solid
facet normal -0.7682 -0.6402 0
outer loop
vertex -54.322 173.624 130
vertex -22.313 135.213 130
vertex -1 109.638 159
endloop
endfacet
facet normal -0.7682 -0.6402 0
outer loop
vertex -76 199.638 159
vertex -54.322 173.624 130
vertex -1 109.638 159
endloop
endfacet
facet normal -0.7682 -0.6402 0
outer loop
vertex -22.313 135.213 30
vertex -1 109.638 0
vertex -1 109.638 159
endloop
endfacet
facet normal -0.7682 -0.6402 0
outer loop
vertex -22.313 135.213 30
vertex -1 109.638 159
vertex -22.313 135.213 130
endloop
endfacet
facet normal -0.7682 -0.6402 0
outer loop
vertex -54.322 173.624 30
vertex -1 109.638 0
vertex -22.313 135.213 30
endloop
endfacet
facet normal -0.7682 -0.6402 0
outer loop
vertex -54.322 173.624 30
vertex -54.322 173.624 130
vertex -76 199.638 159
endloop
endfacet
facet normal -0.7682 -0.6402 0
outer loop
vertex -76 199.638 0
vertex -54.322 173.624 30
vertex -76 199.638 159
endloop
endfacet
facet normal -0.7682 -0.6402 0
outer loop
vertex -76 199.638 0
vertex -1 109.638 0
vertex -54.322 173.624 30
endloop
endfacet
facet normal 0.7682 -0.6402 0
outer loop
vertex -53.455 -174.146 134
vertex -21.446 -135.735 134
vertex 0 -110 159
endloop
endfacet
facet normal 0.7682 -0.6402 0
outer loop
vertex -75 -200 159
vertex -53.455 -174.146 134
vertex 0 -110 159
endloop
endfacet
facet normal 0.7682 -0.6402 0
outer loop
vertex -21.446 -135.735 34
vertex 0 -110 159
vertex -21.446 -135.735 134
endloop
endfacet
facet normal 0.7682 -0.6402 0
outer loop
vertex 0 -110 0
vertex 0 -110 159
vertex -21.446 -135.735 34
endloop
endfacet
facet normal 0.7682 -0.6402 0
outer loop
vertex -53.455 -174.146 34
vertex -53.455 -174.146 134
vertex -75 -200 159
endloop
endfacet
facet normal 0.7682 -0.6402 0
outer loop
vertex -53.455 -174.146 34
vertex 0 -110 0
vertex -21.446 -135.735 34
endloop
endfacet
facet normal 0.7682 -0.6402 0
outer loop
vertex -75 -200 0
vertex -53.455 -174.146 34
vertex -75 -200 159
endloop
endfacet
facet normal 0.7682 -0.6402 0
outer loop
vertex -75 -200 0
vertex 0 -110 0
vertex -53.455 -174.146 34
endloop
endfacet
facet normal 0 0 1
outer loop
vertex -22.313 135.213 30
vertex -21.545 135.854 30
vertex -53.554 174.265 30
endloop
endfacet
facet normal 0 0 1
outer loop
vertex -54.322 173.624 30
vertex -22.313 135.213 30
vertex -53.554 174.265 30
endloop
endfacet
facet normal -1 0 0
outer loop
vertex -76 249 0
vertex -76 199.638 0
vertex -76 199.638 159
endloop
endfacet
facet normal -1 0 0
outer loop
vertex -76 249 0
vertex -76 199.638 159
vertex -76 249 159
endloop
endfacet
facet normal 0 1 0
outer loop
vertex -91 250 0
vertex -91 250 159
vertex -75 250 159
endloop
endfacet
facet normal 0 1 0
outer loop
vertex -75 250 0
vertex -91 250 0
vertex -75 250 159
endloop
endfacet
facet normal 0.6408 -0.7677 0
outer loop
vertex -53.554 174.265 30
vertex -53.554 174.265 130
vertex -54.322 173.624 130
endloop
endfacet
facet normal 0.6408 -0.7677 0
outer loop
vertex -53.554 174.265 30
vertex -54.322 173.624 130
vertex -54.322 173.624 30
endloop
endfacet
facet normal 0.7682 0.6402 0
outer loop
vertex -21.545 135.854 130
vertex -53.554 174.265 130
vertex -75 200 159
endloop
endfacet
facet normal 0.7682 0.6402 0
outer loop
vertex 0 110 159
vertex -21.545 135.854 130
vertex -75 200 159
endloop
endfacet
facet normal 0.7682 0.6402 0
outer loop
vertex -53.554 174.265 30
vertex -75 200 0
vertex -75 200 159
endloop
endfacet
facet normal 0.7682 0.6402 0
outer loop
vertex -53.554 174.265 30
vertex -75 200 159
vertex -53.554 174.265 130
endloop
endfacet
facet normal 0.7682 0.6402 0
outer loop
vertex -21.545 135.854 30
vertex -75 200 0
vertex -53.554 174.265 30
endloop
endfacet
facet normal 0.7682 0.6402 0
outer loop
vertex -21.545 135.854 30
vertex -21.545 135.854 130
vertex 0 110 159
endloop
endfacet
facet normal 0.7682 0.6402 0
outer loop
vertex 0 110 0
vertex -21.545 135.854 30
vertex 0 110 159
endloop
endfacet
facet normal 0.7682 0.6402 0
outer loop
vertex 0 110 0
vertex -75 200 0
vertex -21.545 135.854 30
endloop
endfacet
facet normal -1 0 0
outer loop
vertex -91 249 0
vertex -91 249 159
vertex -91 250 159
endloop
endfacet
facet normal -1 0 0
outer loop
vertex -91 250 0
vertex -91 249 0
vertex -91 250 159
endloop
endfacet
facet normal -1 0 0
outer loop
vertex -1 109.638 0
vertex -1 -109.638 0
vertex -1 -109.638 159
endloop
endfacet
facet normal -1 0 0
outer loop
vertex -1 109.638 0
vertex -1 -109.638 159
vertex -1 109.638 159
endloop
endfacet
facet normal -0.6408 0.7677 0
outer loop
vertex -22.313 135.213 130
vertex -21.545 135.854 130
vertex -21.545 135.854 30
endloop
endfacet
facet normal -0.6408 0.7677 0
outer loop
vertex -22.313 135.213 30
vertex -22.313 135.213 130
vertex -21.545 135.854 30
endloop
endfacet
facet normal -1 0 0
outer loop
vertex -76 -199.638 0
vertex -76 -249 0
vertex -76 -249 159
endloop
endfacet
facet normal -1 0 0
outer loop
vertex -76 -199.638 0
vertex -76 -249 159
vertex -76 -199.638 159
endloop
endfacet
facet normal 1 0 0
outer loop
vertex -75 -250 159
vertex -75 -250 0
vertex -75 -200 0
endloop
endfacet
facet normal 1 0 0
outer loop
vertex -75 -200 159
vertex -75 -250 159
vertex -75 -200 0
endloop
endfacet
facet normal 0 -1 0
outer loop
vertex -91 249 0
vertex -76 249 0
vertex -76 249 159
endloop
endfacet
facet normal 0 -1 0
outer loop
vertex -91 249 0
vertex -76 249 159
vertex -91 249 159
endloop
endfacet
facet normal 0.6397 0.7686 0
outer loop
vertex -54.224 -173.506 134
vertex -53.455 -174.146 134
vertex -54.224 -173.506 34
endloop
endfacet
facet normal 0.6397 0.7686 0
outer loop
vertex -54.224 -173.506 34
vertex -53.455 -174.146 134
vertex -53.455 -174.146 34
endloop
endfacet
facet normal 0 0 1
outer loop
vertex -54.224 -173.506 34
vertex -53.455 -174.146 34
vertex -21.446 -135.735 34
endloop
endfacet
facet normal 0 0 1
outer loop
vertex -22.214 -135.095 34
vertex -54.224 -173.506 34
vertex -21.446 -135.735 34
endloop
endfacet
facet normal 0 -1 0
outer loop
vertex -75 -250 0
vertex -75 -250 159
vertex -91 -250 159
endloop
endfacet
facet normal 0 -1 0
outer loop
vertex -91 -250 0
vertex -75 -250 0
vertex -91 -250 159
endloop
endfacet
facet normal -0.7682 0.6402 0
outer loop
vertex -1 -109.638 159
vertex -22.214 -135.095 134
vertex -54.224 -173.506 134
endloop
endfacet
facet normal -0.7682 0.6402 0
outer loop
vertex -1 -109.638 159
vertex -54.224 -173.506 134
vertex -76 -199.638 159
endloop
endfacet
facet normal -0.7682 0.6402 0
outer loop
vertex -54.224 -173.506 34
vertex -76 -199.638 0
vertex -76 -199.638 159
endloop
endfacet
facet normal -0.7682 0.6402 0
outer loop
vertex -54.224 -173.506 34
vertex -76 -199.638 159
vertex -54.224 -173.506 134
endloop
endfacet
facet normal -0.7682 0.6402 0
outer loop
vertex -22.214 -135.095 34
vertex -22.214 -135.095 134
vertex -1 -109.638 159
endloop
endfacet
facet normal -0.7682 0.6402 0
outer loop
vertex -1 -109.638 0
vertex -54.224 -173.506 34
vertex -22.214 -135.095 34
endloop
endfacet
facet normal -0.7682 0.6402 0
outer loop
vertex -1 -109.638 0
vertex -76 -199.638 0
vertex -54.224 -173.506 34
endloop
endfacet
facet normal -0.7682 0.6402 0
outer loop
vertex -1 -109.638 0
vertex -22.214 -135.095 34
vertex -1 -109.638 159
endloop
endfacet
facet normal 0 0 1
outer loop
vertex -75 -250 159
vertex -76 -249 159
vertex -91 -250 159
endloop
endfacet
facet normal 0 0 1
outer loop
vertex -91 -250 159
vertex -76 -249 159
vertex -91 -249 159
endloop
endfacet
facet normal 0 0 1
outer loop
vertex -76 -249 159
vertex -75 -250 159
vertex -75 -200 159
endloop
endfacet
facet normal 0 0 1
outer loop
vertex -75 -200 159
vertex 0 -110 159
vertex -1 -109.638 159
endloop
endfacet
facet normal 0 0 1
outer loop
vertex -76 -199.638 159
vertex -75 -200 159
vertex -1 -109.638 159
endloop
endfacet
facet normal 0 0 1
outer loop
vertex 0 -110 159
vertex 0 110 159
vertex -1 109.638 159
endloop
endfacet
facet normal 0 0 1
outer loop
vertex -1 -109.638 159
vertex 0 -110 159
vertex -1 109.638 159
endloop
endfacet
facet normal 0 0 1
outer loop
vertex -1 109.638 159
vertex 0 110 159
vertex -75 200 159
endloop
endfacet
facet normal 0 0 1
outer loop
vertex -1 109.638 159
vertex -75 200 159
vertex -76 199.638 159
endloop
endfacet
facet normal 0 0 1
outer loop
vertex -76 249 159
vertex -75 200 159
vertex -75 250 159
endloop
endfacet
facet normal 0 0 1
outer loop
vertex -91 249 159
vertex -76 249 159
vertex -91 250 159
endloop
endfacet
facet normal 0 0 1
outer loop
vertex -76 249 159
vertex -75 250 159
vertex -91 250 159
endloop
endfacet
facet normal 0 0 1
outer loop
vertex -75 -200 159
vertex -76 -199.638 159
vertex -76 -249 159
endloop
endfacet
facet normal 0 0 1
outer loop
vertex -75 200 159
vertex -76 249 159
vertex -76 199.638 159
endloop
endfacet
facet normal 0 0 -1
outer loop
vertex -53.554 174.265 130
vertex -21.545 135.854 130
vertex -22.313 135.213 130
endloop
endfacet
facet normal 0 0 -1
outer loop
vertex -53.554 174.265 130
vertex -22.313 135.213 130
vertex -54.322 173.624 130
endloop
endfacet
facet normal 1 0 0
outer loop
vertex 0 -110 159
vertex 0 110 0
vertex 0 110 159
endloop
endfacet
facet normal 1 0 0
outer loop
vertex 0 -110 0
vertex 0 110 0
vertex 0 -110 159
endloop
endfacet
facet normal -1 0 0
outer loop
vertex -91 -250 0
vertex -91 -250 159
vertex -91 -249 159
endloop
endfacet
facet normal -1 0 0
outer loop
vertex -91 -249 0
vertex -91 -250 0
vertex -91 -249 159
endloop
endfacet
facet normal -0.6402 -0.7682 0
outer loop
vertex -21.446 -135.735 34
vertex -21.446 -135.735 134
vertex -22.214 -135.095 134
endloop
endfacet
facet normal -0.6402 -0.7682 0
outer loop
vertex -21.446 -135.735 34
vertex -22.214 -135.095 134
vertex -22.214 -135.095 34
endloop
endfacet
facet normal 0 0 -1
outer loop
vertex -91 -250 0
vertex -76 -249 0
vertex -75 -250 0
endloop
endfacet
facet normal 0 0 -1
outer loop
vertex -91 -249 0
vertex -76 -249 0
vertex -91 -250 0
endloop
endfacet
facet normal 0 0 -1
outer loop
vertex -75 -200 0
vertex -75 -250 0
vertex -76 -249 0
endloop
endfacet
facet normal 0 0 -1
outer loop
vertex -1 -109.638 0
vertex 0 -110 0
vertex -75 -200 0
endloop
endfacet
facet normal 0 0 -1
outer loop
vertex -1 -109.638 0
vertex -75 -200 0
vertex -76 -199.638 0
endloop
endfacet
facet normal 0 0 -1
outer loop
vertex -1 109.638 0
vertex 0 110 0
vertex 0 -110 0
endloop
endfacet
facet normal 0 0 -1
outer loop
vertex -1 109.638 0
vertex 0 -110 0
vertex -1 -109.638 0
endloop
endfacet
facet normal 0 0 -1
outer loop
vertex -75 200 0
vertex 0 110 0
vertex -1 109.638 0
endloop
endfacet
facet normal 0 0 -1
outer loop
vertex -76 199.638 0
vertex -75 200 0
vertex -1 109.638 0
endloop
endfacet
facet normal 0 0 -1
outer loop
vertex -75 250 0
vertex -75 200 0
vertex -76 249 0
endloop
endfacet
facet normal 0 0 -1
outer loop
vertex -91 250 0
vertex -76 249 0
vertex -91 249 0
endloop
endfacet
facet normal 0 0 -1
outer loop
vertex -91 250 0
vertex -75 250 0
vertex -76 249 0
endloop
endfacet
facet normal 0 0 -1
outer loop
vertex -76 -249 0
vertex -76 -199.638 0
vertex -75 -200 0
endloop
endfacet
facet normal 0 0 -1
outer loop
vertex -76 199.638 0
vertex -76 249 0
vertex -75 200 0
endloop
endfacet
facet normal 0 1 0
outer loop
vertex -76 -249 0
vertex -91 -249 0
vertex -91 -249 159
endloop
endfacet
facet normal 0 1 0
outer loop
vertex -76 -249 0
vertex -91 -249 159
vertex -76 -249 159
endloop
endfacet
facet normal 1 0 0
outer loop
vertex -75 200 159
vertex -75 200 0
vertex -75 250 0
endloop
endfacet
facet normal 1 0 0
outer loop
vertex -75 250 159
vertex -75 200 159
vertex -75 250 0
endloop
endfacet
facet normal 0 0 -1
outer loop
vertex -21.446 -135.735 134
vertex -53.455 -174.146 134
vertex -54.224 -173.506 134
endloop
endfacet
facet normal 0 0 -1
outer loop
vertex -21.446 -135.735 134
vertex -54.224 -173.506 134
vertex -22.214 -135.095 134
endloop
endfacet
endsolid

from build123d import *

# Parameters (mm, degrees)
BOSS_EXTRUDE1_DEPTH = 159
SKETCH2_W           = 100
SKETCH2_H           = 50
CUT_EXTRUDE1_DEPTH  = 160
SKETCH5_W           = 100
SKETCH5_H           = 50
CUT_EXTRUDE2_DEPTH  = 160


with BuildPart() as part:
    # Sketch1 → Boss-Extrude1 (new body)
    with BuildSketch(Plane.XY):
        Polygon((0, 110), (0, -110), (-75, -200), (-75, -249), (-75, -250), (-91, -250), (-91, -249), (-76, -249), (-76, -199.637950065), (-1, -109.637950065), (-1, 109.637950065), (-76, 199.637950065), (-76, 249), (-91, 249), (-91, 250), (-75, 250), (-75, 249), (-75, 200), align=None)
    extrude(amount=BOSS_EXTRUDE1_DEPTH)

    # Sketch2 → Cut-Extrude1 (cut)
    with BuildSketch(Plane(origin=(54.098360656, -45.081967213, 0), x_dir=(0, 0, -1), z_dir=(0.76822128, -0.6401844, 0))):
        with Locations((-84, -143.004340756)):
            Rectangle(SKETCH2_W, SKETCH2_H)
    extrude(amount=-CUT_EXTRUDE1_DEPTH, mode=Mode.SUBTRACT)

    # Sketch5 → Cut-Extrude2 (cut)
    with BuildSketch(Plane(origin=(54.098360656, 45.081967213, 0), x_dir=(0, 0, -1), z_dir=(0.76822128, 0.6401844, 0))):
        with Locations((-80, 143.158085894)):
            Rectangle(SKETCH5_W, SKETCH5_H)
    extrude(amount=-CUT_EXTRUDE2_DEPTH, mode=Mode.SUBTRACT)


solid = part.part
